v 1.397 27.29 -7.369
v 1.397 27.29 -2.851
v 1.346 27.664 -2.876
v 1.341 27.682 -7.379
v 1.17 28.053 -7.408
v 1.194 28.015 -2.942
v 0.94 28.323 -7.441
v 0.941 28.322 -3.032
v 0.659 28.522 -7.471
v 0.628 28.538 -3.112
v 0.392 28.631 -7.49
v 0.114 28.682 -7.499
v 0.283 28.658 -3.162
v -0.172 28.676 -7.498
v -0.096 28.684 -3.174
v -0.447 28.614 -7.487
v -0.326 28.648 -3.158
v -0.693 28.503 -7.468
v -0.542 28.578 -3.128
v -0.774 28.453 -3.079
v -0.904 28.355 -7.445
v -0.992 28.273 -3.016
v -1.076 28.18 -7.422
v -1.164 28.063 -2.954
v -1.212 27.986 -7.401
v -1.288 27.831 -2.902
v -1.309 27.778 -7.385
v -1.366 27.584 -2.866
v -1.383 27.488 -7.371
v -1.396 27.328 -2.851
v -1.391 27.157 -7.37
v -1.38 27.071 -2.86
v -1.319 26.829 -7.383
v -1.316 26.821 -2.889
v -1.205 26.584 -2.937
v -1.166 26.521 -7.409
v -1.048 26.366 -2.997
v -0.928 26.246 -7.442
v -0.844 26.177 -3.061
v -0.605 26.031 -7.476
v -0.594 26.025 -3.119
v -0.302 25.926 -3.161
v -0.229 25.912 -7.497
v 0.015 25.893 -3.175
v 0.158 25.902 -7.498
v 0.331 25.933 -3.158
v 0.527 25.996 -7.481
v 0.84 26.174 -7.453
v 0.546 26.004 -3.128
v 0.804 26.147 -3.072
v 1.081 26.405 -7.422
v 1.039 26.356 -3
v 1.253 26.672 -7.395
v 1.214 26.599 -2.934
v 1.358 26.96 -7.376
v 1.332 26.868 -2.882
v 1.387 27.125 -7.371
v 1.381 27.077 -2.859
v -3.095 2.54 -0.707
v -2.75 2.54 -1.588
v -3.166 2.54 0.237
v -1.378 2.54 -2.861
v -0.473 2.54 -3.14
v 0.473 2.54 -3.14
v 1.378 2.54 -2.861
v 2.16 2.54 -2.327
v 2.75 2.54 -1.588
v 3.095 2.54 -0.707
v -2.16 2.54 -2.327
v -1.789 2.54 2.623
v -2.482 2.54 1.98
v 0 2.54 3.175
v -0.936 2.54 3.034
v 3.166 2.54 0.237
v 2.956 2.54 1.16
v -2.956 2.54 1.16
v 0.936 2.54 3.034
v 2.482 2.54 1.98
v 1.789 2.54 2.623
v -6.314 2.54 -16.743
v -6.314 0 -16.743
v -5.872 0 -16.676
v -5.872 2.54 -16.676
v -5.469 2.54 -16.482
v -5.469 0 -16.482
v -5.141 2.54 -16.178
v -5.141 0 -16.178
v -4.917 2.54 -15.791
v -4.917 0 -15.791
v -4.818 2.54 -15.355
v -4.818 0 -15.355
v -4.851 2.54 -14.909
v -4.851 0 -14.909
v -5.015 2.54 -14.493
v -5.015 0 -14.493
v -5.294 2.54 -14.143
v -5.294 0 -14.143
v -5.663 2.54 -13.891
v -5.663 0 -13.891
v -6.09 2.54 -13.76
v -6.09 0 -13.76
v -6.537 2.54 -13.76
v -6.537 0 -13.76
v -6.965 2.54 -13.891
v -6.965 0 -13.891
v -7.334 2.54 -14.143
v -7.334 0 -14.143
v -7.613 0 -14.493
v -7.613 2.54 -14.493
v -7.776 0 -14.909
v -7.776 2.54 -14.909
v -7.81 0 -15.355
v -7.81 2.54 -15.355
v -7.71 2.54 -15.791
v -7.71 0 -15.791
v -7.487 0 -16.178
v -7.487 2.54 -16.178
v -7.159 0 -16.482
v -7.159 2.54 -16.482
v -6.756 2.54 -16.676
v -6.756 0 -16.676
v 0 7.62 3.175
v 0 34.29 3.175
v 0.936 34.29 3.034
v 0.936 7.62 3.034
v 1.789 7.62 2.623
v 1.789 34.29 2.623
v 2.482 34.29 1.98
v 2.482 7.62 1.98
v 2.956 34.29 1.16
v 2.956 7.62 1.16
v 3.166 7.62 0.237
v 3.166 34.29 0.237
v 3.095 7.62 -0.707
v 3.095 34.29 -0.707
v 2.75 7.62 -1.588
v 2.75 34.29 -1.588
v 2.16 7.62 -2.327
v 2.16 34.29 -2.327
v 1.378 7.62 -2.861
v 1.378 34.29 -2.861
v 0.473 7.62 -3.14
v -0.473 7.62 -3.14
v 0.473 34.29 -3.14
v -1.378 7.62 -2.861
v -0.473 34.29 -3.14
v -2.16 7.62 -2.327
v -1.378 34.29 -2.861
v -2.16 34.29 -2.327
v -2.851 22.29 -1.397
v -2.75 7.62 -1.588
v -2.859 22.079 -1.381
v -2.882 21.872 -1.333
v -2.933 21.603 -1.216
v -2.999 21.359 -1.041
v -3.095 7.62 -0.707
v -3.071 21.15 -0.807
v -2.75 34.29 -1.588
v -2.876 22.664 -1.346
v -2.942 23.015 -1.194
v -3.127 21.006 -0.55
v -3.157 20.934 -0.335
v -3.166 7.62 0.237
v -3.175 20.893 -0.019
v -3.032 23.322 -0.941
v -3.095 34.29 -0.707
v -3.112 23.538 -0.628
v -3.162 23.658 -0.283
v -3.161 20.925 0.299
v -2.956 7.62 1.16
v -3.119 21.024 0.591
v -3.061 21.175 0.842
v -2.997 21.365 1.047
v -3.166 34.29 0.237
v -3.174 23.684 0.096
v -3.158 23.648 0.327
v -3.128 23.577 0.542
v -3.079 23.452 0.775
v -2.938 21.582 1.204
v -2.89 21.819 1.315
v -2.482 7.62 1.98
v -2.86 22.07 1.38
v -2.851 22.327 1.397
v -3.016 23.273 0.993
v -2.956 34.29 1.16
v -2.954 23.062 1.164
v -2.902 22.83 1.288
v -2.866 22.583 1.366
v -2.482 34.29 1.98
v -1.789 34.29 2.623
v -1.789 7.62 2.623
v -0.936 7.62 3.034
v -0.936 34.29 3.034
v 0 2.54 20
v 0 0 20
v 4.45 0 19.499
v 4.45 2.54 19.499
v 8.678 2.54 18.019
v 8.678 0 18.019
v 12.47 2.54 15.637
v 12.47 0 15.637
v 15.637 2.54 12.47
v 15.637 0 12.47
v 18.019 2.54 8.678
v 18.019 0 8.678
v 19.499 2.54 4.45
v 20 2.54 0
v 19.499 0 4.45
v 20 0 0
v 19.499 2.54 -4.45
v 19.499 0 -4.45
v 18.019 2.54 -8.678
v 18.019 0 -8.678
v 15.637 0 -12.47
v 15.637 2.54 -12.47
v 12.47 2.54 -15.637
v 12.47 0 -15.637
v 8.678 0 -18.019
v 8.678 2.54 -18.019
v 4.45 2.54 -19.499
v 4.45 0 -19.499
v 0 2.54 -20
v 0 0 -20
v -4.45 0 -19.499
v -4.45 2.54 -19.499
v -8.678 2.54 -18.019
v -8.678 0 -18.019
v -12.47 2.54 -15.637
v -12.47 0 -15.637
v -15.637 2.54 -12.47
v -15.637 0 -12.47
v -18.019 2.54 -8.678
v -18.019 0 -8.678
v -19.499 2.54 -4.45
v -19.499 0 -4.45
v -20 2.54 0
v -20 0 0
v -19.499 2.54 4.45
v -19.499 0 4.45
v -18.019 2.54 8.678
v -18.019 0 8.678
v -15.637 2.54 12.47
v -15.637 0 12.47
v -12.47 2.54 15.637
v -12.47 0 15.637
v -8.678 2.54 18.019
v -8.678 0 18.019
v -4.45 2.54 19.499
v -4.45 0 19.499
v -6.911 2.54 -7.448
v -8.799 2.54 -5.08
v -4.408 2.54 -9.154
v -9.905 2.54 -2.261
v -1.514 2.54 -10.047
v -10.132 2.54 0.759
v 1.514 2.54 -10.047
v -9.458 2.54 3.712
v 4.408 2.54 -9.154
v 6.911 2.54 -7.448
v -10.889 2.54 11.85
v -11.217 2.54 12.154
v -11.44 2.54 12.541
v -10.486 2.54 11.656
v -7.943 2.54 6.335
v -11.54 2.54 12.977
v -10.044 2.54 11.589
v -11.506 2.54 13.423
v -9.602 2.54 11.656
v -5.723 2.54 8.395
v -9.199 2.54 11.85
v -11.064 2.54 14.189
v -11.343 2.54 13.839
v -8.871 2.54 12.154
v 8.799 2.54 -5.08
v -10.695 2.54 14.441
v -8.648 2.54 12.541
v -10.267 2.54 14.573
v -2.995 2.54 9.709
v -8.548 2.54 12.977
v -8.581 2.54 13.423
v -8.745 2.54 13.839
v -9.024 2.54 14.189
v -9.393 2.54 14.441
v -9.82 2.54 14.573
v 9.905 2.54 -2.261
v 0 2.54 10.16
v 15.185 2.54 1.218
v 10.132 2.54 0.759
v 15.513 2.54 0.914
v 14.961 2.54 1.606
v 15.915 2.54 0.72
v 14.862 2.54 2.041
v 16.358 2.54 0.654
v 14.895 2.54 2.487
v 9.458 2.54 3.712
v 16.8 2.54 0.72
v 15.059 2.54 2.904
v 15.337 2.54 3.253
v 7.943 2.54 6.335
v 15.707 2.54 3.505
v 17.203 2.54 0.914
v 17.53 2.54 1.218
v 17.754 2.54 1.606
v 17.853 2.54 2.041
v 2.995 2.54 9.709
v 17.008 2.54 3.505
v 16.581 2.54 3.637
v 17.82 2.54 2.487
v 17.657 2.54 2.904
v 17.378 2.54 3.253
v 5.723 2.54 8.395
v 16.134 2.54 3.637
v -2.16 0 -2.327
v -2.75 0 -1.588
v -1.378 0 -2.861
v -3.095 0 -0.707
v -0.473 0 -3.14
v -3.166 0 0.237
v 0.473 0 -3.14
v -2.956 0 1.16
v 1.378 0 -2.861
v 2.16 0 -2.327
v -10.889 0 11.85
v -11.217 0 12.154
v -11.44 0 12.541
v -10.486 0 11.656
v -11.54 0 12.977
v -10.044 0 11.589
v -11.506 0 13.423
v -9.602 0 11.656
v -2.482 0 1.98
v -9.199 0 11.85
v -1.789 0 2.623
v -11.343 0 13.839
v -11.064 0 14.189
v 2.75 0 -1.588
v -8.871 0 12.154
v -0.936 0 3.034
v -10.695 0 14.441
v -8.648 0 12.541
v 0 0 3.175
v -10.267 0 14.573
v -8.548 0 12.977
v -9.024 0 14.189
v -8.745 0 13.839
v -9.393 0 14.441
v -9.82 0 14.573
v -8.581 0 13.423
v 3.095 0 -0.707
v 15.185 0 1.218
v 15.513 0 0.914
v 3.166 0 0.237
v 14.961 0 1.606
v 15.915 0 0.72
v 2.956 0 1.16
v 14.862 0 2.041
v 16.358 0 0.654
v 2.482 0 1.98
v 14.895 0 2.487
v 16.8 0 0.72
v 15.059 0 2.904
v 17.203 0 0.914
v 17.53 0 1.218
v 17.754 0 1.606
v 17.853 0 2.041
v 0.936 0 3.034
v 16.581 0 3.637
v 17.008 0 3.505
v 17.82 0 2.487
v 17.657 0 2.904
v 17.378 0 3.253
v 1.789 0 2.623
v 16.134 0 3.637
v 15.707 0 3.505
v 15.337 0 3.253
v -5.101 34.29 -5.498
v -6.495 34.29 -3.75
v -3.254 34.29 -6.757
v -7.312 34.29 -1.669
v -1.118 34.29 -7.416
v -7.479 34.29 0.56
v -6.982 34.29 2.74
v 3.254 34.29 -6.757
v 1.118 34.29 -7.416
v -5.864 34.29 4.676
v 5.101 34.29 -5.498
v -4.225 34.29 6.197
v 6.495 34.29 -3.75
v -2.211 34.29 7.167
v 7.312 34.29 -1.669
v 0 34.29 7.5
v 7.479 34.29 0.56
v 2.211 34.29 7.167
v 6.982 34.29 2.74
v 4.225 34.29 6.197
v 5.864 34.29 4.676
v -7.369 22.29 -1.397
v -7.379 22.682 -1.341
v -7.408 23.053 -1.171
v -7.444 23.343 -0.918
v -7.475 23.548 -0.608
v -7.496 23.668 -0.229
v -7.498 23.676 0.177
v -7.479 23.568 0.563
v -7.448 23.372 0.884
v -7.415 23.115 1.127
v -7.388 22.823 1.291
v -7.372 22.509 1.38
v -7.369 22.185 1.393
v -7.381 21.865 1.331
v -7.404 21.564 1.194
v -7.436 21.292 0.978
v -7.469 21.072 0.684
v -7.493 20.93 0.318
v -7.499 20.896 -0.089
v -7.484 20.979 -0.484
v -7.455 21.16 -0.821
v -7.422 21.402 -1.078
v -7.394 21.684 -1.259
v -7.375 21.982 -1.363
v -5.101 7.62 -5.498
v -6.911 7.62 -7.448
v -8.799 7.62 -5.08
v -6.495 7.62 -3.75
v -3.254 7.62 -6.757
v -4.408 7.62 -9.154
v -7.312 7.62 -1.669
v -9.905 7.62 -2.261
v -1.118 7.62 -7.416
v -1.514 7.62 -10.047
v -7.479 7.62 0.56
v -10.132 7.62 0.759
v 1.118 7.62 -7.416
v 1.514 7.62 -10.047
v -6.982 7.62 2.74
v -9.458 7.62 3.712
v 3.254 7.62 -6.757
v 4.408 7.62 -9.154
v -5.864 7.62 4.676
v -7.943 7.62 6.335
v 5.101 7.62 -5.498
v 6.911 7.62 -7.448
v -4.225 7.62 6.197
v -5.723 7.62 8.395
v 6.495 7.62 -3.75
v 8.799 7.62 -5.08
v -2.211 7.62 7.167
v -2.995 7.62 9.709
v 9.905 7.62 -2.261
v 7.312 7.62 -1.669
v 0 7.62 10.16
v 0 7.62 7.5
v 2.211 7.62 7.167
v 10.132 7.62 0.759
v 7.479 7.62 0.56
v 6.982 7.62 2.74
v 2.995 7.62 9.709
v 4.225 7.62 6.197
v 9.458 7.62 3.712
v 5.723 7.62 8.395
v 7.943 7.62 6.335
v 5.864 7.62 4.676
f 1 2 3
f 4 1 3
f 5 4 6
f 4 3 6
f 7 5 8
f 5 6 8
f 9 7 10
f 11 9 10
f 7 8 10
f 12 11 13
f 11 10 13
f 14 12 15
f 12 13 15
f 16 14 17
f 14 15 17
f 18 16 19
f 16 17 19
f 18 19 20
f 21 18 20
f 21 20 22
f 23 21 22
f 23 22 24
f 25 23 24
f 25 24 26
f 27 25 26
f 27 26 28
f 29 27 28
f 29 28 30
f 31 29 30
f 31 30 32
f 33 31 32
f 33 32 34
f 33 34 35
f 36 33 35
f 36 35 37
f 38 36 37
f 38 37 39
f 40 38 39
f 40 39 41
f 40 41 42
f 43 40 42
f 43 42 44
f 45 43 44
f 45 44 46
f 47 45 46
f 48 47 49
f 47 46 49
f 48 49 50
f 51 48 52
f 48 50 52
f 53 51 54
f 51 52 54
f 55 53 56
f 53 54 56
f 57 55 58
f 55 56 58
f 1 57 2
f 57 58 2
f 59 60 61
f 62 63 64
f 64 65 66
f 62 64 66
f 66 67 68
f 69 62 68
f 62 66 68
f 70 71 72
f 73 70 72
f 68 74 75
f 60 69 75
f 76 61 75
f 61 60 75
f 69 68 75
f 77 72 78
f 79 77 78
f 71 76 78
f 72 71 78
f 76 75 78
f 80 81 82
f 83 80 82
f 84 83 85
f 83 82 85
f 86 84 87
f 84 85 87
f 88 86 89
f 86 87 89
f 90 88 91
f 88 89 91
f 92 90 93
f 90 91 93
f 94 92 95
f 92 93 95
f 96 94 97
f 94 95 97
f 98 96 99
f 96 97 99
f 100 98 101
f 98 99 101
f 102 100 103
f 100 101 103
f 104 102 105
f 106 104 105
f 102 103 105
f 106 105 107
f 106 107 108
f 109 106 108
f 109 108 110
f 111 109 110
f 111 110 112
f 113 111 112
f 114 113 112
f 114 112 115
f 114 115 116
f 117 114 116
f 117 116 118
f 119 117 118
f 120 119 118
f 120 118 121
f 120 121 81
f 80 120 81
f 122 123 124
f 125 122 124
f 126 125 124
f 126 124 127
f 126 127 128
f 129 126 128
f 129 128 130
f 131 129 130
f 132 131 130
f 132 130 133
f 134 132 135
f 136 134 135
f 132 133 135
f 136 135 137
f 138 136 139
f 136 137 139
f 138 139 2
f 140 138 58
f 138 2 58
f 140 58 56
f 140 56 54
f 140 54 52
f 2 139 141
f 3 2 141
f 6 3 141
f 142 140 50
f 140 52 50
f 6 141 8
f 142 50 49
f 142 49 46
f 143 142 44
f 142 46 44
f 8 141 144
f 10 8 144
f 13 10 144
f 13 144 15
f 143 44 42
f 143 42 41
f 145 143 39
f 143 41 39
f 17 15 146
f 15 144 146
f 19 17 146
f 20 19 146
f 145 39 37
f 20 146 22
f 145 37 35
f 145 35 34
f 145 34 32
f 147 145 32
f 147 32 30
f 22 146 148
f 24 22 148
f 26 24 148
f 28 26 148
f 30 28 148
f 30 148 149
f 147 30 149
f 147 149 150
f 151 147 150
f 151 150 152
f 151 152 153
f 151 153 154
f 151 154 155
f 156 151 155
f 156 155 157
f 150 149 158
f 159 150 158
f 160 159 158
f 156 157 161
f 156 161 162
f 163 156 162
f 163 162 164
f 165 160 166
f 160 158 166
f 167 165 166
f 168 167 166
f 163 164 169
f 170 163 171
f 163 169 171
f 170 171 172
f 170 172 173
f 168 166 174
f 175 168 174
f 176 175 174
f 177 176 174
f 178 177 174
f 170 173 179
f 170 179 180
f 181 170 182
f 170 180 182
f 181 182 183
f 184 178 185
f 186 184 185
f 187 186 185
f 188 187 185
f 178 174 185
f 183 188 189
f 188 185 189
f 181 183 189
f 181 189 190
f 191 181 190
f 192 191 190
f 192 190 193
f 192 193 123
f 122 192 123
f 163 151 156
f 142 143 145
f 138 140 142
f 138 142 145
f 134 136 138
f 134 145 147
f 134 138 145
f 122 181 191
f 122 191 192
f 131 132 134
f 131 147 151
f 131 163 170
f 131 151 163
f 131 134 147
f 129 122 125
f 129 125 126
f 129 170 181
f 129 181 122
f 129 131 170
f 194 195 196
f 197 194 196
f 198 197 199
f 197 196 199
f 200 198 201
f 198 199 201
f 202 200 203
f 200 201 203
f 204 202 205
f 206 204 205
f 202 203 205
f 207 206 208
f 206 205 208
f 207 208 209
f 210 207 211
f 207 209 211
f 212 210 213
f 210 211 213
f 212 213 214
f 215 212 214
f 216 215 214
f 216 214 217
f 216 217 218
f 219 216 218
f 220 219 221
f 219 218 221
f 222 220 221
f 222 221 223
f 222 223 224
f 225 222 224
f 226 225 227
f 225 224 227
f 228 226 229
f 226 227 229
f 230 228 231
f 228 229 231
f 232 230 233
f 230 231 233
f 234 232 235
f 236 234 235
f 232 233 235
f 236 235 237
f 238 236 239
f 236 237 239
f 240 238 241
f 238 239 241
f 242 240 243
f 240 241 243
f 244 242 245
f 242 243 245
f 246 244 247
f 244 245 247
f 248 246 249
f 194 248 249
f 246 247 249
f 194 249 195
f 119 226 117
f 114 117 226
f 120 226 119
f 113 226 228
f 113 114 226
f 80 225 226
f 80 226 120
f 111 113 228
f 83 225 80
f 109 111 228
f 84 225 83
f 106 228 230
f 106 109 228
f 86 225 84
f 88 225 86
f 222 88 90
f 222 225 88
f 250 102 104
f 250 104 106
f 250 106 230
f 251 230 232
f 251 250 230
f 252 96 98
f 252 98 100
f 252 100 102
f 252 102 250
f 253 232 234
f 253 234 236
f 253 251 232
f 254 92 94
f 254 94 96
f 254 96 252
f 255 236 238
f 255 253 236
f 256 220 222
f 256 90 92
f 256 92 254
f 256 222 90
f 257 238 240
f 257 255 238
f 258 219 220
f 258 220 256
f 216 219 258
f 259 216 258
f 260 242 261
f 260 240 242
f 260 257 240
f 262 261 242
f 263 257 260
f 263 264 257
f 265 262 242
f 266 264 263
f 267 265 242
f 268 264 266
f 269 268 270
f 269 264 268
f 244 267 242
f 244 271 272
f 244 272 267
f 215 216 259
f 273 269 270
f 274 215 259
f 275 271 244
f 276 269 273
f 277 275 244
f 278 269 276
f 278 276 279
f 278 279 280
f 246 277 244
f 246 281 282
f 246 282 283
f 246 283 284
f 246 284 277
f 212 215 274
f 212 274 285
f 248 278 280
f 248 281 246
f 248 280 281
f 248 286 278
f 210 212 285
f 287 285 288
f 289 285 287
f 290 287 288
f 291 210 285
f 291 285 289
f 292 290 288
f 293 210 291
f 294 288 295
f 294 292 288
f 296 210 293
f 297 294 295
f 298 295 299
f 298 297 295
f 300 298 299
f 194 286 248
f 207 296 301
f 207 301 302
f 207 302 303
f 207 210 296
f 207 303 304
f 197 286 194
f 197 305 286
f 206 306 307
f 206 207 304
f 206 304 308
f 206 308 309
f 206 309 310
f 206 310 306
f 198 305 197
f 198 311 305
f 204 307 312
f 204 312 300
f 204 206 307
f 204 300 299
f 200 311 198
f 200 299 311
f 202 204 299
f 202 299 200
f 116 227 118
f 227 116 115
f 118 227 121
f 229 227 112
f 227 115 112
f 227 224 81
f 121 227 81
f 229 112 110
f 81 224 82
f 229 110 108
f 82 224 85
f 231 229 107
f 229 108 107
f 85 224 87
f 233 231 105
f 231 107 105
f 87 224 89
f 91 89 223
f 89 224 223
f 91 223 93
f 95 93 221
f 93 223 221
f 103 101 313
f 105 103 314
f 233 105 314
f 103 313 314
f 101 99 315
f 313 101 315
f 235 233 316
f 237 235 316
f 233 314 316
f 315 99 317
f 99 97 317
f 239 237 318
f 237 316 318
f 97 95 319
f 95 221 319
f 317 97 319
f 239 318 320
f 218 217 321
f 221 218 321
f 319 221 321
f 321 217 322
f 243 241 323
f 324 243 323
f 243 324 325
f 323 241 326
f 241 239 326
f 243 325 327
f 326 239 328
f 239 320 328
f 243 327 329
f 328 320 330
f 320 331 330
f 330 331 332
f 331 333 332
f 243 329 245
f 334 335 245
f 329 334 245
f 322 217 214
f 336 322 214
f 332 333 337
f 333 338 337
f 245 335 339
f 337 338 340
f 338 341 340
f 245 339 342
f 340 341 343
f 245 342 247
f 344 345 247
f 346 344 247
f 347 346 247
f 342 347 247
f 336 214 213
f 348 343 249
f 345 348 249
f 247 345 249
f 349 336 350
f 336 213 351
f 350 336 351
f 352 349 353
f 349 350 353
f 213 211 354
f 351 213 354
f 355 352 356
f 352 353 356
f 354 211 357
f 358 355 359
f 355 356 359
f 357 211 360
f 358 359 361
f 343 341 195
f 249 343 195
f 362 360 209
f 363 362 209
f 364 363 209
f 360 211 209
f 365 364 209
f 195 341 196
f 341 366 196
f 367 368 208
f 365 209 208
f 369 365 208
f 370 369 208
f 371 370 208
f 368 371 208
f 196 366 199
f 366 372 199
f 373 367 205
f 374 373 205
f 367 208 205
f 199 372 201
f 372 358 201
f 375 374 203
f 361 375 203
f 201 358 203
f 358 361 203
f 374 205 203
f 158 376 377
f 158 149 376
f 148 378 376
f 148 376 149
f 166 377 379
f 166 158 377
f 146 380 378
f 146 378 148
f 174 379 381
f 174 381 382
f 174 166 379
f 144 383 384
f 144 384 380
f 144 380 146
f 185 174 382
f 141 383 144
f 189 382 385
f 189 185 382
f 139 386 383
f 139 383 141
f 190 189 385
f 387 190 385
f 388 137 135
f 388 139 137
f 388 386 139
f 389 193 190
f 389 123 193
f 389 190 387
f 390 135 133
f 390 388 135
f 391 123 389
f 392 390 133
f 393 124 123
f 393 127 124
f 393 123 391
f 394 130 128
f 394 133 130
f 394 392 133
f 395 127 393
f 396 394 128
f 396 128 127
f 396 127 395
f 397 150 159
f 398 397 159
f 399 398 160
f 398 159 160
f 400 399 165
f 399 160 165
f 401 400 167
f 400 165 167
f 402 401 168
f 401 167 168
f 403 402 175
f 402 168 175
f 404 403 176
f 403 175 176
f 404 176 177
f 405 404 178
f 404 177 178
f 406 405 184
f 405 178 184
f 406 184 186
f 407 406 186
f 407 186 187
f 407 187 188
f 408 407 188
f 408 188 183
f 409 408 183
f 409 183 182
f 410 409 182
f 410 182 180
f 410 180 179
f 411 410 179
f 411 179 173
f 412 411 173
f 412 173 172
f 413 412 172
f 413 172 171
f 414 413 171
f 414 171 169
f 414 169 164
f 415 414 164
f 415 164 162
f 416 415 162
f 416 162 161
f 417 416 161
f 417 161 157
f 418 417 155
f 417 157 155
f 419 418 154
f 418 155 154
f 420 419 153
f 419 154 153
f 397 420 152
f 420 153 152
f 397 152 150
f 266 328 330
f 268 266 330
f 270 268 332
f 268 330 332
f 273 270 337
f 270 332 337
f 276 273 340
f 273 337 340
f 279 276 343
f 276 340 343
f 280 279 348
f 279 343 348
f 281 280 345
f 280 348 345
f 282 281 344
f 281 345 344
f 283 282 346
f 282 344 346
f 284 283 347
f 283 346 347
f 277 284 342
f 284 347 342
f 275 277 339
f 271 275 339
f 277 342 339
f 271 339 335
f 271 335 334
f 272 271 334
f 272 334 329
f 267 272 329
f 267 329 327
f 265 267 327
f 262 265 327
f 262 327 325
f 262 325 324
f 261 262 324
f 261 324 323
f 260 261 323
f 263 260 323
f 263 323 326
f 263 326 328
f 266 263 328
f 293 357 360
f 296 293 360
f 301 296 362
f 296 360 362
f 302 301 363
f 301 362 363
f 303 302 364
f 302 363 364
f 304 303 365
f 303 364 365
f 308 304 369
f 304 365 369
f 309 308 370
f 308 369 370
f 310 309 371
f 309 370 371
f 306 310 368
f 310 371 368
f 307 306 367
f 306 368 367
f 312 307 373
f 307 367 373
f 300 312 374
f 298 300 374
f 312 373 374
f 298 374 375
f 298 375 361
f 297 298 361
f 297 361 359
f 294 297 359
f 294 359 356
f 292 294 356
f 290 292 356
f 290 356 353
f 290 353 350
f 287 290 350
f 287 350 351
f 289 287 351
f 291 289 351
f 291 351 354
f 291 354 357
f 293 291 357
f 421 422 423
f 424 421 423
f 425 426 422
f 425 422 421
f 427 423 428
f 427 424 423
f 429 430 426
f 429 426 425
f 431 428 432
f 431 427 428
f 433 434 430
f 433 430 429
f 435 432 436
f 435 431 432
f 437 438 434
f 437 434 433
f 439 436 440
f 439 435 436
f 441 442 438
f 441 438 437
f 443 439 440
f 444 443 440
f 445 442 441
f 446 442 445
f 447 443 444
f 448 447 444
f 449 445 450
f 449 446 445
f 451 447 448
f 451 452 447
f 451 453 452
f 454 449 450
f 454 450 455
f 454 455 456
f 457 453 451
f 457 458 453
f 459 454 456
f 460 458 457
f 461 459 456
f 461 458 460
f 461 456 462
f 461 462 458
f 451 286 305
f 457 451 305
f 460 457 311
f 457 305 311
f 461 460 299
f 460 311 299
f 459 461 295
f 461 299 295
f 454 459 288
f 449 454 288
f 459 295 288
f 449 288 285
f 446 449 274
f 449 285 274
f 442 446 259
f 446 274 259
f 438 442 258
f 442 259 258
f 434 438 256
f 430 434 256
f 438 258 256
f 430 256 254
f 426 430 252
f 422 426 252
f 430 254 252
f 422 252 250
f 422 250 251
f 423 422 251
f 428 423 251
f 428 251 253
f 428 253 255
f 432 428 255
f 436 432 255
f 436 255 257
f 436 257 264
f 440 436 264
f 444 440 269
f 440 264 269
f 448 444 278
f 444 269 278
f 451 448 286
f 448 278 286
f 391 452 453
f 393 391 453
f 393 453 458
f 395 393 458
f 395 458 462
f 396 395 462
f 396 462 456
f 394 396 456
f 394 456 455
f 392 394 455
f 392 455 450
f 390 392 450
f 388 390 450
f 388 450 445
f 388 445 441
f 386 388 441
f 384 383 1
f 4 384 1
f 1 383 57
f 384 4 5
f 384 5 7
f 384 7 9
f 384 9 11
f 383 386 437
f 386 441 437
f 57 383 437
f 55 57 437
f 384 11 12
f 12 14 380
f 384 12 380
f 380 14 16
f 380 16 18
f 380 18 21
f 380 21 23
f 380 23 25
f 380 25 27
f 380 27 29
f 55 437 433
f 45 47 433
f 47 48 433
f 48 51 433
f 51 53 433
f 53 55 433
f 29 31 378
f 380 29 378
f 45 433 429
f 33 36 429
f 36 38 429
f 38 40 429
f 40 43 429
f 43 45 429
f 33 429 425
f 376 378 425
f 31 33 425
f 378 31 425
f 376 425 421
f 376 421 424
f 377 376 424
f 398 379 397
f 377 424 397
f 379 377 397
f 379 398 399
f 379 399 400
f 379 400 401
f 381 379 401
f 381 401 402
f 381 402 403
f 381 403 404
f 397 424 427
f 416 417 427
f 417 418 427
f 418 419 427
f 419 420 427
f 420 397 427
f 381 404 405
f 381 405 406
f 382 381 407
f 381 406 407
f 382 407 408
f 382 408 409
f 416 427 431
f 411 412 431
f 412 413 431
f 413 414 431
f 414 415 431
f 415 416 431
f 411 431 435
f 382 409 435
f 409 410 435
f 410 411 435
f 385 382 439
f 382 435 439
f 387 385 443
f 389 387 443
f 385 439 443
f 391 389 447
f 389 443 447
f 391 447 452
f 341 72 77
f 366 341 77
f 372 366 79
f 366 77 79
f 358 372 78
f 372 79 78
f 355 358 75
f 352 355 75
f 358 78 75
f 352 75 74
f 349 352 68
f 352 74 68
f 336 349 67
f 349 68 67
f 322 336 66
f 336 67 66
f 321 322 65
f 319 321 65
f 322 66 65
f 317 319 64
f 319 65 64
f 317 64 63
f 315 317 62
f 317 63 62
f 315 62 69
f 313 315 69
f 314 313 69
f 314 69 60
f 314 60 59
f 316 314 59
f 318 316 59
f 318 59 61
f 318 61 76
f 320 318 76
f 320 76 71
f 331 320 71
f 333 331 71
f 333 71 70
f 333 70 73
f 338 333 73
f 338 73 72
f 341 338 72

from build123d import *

# Parameters (mm, degrees)
SKETCH1_R           = 20
BOSS_EXTRUDE1_DEPTH = 2.54
SKETCH2_R           = 7.499999986
BOSS_EXTRUDE2_DEPTH = 31.75
SKETCH6_R           = 1.5
CUT_EXTRUDE2_DEPTH  = 45.450017998
SKETCH7_R           = 3.175
CUT_EXTRUDE3_DEPTH  = 45.450017998
SKETCH8_R           = 1.397
CUT_EXTRUDE4_DEPTH  = 45.450017998
SKETCH9_R           = 1.397
CUT_EXTRUDE5_DEPTH  = 45.450018075
SKETCH10_R          = 10.16
BOSS_EXTRUDE3_DEPTH = 5.08


with BuildPart() as part:
    # Sketch1 → Boss-Extrude1 (new body)
    with BuildSketch(Plane(origin=(0, 0, 0), x_dir=(1, 0, 0), z_dir=(0, 1, 0))):
        with Locations(Location((0, 0, 0), (0, 0, 270))):
            Circle(SKETCH1_R)
    extrude(amount=BOSS_EXTRUDE1_DEPTH)

    # Sketch2 → Boss-Extrude2 (add)
    with BuildSketch(Plane(origin=(0, 2.54, 0), x_dir=(1, 0, 0), z_dir=(0, 1, 0))):
        with Locations(Location((0, 0, 0), (0, 0, 270))):
            Circle(SKETCH2_R)
    extrude(amount=BOSS_EXTRUDE2_DEPTH)

    # Sketch6 → Cut-Extrude2 (cut, through all)
    with BuildSketch(Plane(origin=(0, 0, 0), x_dir=(-1, 0, 0), z_dir=(0, -1, 0))):
        with Locations(Location((6.313805851, 15.242875716, 0), (0, 0, 90))):
            Circle(SKETCH6_R)
        with Locations(Location((10.043814672, -13.08935412, 0), (0, 0, 90))):
            Circle(SKETCH6_R)
        with Locations(Location((-16.357620523, -2.153521596, 0), (0, 0, 90))):
            Circle(SKETCH6_R)
    extrude(amount=-CUT_EXTRUDE2_DEPTH, mode=Mode.SUBTRACT)

    # Sketch7 → Cut-Extrude3 (cut, through all)
    with BuildSketch(Plane(origin=(0, 34.29, 0), x_dir=(1, 0, 0), z_dir=(0, 1, 0))):
        with Locations(Location((0, 0, 0), (0, 0, 270))):
            Circle(SKETCH7_R)
    extrude(amount=-CUT_EXTRUDE3_DEPTH, mode=Mode.SUBTRACT)

    # Sketch8 → Cut-Extrude4 (cut, through all)
    with BuildSketch(Plane(origin=(0, 0, 0), x_dir=(0, 0, -1), z_dir=(1, 0, 0))):
        with Locations((0, 22.29)):
            Circle(SKETCH8_R)
    extrude(amount=-CUT_EXTRUDE4_DEPTH, mode=Mode.SUBTRACT)

    # Sketch9 → Cut-Extrude5 (cut, through all)
    with BuildSketch(Plane.XY):
        with Locations((0, 27.29)):
            Circle(SKETCH9_R)
    extrude(amount=-CUT_EXTRUDE5_DEPTH, mode=Mode.SUBTRACT)

    # Sketch10 → Boss-Extrude3 (add)
    with BuildSketch(Plane(origin=(0, 2.54, 0), x_dir=(1, 0, 0), z_dir=(0, 1, 0))):
        with Locations(Location((0, 0, 0), (0, 0, 270))):
            Circle(SKETCH10_R)
    extrude(amount=BOSS_EXTRUDE3_DEPTH)


solid = part.part
